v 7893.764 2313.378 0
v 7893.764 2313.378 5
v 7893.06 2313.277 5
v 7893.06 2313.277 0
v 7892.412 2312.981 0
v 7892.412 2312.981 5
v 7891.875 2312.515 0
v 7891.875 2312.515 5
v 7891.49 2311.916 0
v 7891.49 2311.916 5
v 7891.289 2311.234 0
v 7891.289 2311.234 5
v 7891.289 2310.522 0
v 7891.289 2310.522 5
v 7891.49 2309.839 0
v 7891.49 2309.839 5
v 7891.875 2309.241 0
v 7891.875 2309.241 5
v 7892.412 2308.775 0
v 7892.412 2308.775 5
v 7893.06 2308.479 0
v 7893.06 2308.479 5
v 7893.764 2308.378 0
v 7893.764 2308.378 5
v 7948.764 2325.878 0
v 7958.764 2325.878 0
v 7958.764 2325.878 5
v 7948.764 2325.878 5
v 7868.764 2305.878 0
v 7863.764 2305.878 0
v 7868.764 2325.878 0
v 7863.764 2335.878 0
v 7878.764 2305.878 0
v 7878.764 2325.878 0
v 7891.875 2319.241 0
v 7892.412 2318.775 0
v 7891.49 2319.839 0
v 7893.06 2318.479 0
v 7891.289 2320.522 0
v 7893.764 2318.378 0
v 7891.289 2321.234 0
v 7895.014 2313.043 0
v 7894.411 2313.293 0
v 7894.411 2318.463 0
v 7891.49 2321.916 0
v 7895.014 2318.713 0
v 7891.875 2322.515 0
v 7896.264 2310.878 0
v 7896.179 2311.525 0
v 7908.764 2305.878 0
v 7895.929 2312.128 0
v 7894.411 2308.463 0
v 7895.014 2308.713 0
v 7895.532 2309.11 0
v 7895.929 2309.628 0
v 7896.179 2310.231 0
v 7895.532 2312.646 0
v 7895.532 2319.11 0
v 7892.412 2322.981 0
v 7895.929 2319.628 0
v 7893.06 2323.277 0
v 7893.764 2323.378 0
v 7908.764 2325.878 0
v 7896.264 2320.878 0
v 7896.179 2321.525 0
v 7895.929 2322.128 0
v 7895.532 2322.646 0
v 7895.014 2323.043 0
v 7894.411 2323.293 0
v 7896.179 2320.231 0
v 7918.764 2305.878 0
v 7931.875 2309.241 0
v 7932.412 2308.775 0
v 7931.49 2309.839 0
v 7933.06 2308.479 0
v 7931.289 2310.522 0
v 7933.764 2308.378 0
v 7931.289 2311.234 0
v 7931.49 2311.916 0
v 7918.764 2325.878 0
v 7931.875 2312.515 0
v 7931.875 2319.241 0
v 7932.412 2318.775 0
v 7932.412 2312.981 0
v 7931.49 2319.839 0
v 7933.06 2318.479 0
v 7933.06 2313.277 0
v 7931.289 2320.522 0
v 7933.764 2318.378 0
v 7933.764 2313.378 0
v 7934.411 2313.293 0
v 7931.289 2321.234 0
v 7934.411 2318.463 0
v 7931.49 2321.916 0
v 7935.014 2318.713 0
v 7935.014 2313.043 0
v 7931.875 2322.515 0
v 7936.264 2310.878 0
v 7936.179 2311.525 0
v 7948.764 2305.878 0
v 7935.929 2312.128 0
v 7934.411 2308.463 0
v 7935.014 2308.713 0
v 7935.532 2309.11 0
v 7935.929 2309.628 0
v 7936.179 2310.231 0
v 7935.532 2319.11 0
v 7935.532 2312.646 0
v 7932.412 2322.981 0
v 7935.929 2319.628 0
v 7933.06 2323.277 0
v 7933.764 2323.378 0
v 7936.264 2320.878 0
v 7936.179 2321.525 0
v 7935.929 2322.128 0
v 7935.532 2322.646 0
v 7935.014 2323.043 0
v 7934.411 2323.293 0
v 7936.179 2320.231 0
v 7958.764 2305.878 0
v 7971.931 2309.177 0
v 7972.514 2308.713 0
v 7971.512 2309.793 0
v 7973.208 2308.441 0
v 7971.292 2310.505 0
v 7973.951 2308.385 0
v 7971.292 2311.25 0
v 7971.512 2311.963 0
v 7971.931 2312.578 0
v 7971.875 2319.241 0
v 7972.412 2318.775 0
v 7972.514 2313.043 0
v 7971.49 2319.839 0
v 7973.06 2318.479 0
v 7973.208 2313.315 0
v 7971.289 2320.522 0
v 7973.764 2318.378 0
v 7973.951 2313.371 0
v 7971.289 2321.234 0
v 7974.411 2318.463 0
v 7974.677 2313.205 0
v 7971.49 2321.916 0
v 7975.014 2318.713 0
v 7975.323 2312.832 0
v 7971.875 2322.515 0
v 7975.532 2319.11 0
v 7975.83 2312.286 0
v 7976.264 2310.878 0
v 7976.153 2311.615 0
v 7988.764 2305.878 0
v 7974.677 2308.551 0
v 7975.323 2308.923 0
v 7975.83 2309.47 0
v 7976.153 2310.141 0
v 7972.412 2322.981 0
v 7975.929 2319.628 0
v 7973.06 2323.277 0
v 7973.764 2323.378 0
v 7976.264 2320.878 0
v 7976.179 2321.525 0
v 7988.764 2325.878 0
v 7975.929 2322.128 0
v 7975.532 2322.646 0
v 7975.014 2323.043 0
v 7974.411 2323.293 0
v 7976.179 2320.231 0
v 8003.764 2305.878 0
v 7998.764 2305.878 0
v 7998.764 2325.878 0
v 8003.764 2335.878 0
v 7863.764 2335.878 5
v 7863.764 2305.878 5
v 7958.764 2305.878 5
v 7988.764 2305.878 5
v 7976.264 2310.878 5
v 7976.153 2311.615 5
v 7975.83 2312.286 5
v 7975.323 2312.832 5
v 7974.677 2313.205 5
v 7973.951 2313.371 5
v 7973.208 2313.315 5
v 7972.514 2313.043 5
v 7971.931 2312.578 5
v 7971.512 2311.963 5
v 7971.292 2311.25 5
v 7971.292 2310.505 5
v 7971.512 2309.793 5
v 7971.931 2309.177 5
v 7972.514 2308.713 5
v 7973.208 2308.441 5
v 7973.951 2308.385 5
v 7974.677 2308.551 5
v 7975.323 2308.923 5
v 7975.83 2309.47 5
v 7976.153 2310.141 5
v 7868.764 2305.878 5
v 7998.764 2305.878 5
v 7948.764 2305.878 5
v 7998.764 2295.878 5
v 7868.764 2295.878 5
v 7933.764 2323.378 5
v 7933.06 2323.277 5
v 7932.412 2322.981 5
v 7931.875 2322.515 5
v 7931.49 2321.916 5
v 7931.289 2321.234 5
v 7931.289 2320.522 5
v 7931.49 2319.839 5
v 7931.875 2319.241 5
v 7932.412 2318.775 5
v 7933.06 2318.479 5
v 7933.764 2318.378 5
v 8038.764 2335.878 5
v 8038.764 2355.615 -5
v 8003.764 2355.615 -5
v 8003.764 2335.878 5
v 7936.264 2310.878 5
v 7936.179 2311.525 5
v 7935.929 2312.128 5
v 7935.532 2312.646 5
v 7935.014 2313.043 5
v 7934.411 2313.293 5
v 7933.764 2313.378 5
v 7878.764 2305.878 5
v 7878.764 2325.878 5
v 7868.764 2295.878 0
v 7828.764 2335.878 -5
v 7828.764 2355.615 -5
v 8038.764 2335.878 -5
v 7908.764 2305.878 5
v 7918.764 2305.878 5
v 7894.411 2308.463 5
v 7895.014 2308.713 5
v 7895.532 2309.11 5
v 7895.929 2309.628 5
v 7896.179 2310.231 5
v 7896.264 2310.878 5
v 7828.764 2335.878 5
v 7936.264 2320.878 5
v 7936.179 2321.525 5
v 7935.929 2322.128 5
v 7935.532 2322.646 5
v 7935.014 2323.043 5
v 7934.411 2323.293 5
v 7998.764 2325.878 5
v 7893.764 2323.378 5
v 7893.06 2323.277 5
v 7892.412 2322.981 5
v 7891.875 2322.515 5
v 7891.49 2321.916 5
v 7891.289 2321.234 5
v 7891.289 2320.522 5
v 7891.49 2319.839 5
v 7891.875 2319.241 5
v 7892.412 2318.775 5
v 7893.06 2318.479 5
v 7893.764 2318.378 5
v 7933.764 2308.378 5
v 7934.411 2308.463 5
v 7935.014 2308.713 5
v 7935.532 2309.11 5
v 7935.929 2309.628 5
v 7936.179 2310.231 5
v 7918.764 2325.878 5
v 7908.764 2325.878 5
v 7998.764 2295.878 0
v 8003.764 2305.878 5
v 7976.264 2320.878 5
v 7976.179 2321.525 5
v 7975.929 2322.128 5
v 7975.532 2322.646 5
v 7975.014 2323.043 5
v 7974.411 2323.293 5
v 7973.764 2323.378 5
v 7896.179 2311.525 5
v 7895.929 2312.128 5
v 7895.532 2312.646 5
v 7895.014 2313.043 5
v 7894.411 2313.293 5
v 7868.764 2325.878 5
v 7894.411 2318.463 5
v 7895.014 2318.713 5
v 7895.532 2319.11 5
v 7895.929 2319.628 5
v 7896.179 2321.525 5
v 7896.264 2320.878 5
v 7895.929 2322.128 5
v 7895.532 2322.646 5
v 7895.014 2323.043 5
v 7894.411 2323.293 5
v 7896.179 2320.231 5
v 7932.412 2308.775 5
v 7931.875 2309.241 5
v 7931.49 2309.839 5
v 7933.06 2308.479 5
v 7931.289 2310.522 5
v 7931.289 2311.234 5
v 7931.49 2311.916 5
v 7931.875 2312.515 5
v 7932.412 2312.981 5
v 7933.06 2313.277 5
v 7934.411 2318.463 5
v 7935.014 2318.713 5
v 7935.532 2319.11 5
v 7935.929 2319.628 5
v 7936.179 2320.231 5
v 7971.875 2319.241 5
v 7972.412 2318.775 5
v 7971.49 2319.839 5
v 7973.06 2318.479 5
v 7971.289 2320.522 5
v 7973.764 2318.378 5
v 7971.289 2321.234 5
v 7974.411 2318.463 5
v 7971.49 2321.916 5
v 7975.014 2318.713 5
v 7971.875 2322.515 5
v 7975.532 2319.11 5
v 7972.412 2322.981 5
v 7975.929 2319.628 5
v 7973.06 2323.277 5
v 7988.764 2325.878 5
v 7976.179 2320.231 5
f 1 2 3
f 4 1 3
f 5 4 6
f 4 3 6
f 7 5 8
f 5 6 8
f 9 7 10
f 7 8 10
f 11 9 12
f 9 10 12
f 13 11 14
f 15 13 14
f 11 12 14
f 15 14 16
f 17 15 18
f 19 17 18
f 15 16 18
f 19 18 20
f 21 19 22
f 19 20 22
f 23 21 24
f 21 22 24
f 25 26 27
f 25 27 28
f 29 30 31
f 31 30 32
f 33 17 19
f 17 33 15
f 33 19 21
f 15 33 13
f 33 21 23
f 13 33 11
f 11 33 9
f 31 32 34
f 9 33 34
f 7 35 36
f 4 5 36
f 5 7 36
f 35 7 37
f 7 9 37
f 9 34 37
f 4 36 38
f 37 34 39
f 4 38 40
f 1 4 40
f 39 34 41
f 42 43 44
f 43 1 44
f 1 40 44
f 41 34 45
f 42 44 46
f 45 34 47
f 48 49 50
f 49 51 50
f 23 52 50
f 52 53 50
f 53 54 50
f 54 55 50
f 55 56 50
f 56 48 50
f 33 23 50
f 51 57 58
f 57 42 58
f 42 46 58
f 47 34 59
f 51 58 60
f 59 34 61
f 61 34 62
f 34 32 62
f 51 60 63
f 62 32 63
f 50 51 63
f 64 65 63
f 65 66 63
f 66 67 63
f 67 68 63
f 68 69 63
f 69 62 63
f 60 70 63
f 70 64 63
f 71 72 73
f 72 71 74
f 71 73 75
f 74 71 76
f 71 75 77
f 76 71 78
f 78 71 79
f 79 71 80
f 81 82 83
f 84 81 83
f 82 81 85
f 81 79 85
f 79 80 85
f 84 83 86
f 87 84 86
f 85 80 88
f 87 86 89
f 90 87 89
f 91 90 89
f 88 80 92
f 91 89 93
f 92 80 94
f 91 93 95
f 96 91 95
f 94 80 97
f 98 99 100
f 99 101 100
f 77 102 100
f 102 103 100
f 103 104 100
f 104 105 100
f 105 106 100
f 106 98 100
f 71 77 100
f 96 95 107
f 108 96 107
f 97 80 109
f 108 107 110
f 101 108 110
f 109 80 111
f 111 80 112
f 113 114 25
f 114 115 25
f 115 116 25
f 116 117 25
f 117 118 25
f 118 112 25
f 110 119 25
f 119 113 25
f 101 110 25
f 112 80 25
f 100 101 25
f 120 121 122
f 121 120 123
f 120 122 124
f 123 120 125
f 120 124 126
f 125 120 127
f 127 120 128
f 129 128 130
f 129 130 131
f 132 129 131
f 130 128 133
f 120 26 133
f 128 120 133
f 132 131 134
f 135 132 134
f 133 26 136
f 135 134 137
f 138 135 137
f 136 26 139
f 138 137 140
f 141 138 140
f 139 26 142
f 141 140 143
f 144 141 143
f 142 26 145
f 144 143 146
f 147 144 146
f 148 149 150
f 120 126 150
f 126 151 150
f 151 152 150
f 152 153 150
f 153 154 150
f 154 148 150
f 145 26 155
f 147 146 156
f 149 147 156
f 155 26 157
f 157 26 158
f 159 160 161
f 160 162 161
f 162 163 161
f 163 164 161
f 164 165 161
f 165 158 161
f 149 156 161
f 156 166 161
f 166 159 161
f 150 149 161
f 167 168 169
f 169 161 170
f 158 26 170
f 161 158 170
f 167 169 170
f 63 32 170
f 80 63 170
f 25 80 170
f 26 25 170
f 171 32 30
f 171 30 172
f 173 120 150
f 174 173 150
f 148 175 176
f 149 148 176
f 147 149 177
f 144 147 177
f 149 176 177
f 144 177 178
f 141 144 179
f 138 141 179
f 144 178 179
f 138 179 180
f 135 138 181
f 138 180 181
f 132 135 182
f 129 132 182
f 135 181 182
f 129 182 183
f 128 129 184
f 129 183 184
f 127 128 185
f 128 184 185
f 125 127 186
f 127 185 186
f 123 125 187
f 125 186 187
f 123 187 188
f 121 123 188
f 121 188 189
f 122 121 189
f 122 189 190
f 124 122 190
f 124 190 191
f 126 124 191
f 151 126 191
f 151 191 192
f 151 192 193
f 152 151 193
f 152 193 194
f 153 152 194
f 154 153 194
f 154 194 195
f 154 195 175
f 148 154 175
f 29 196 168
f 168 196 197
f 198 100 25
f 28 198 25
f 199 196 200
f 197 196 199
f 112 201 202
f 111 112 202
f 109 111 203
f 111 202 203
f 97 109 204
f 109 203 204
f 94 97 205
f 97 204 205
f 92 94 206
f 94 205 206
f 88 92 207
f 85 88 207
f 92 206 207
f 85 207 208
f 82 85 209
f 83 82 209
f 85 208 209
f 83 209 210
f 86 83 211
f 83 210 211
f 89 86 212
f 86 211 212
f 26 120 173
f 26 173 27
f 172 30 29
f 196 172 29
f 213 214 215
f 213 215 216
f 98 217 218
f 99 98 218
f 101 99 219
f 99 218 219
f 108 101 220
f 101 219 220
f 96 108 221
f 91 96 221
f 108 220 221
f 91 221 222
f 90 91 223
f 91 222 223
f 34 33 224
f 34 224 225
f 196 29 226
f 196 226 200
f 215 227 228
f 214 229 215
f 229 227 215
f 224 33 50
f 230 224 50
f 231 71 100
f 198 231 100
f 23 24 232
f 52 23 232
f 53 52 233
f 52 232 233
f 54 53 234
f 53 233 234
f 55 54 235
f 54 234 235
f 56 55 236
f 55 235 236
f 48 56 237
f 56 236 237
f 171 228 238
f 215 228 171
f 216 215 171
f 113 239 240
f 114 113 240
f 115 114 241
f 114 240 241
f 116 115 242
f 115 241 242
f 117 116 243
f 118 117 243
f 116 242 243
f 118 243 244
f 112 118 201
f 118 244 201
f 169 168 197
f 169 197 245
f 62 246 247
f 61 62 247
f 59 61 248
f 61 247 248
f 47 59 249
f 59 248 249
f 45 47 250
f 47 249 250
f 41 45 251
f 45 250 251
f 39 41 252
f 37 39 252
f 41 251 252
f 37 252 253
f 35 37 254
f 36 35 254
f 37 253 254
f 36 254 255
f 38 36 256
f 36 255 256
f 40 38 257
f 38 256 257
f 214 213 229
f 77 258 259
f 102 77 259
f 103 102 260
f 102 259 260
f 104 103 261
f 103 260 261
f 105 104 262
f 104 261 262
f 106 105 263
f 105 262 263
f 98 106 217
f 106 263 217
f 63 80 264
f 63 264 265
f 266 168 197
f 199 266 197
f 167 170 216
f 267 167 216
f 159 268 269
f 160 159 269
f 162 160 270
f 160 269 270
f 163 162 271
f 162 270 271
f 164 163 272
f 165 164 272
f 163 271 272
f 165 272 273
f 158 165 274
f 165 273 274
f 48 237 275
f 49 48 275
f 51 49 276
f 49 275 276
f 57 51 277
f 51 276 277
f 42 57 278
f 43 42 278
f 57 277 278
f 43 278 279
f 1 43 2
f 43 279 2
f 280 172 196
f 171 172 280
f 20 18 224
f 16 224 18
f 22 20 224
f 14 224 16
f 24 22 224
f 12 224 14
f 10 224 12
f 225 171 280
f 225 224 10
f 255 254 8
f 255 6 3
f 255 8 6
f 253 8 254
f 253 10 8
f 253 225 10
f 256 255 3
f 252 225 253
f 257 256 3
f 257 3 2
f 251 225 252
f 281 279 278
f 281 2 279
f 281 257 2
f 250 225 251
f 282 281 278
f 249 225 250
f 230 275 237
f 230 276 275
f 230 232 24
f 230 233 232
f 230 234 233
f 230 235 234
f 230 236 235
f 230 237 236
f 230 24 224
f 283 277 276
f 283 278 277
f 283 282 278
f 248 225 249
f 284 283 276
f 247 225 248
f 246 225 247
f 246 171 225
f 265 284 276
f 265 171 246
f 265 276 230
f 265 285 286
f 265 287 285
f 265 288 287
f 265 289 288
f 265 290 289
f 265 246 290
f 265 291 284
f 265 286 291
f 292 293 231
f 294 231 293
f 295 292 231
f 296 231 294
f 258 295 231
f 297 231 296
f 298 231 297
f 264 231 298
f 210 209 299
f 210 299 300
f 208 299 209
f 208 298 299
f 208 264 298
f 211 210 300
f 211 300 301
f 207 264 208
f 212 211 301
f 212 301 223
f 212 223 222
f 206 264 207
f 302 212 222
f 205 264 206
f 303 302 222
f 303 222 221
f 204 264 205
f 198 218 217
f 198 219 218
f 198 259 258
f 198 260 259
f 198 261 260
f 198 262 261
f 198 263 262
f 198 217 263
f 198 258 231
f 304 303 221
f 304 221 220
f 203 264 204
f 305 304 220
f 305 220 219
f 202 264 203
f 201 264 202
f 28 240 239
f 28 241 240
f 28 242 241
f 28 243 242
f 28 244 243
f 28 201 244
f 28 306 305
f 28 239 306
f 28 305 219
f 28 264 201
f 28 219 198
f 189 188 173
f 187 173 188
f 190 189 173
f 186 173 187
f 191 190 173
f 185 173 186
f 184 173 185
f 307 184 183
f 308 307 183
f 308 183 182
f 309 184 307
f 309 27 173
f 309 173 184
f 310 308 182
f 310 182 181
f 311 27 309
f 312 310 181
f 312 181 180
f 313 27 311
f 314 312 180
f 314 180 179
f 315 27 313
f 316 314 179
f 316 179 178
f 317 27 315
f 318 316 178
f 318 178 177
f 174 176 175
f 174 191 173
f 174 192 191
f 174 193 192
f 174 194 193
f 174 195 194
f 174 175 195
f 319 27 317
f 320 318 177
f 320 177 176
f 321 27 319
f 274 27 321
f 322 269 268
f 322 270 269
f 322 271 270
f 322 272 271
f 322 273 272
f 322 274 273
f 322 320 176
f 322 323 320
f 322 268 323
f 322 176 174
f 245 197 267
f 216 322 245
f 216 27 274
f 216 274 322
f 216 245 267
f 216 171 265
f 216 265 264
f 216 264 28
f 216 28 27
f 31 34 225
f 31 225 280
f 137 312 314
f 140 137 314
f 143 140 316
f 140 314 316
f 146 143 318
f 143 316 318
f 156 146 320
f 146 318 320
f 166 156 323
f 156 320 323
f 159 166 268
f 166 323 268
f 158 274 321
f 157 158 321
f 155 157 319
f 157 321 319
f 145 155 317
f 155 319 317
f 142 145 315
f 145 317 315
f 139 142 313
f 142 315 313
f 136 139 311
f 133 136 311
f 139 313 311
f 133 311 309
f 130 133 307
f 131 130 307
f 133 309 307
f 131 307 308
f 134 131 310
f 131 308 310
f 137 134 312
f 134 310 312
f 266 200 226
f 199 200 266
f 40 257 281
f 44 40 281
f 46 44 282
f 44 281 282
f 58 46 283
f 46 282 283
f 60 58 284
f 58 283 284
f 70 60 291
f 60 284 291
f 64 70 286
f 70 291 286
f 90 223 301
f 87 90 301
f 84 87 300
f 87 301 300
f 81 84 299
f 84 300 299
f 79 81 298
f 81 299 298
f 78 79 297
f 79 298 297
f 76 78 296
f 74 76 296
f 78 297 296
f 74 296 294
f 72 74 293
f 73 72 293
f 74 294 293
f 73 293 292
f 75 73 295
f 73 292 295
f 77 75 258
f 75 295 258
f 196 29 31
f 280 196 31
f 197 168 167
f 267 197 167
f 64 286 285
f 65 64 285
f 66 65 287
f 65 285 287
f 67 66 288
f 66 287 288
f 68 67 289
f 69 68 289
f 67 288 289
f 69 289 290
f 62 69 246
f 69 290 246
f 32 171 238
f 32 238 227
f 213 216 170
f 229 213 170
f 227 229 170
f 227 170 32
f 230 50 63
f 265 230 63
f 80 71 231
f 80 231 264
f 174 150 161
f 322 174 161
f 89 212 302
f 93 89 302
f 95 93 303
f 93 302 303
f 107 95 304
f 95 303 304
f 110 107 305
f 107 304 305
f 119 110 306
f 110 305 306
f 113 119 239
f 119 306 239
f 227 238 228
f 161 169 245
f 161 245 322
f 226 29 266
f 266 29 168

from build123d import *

# Parameters (mm, degrees)
SKETCH_1_W          = 140
SKETCH_1_H          = 30
EXTRUDE_1_DEPTH     = 5
SKETCH_2_W          = 10
SKETCH_2_H          = 20
CUT_EXTRUDE_1_DEPTH = 50
EXTRUDE_2_DEPTH     = 140
EXTRUDE_3_DEPTH     = 35
EXTRUDE_4_DEPTH     = 35
SKETCH_6_W          = 130
SKETCH_6_H          = 5
EXTRUDE_7_DEPTH     = 10
SKETCH_8_R          = 2.5
CUT_EXTRUDE_2_DEPTH = 10


with BuildPart() as part:
    # 스케치1 → 보스-돌출1 (new body)
    with BuildSketch(Plane.XY):
        with Locations((7933.764003989, 2320.877862595)):
            Rectangle(SKETCH_1_W, SKETCH_1_H)
    extrude(amount=EXTRUDE_1_DEPTH)

    # 스케치2 → 컷-돌출1 (cut)
    with BuildSketch(Plane(origin=(0, 0, 0), x_dir=(-1, 0, 0), z_dir=(0, 0, -1))):
        with Locations((-7993.764003989, 2315.877862595)):
            Rectangle(SKETCH_2_W, SKETCH_2_H)
        with Locations((-7953.764003989, 2315.877862595)):
            Rectangle(SKETCH_2_W, SKETCH_2_H)
        with Locations((-7913.764003989, 2315.877862595)):
            Rectangle(SKETCH_2_W, SKETCH_2_H)
        with Locations((-7873.764003989, 2315.877862595)):
            Rectangle(SKETCH_2_W, SKETCH_2_H)
    extrude(amount=-CUT_EXTRUDE_1_DEPTH, mode=Mode.SUBTRACT)

    # 스케치3 → 보스-돌출2 (add)
    with BuildSketch(Plane.ZY.offset(-7863.764003989)):
        Polygon((-5, 2335.877862595), (0, 2335.877862595), (5, 2335.877862595), (-5, 2355.6147047), align=None)
    extrude(amount=-EXTRUDE_2_DEPTH)

    # 스케치4 → 보스-돌출3 (add)
    with BuildSketch(Plane(origin=(8003.764003989, 0, 0), x_dir=(0, 0, -1), z_dir=(1, 0, 0))):
        Polygon((-5, 2335.877862595), (5, 2335.877862595), (5, 2355.614704701), align=None)
    extrude(amount=EXTRUDE_3_DEPTH)

    # 스케치5 → 보스-돌출4 (add)
    with BuildSketch(Plane.ZY.offset(-7863.764003989)):
        Polygon((5, 2335.877862595), (-5, 2335.877862595), (-5, 2355.6147047), align=None)
    extrude(amount=EXTRUDE_4_DEPTH)

    # 스케치8 → 컷-돌출2 (cut)
    with BuildSketch(Plane.XY.offset(5)):
        with BuildLine():
            ThreePointArc((7896.264003989, 2320.877862595), (7895.531770942, 2322.645629548), (7893.764003989, 2323.377862595))
            Line((7893.764003989, 2323.377862595), (7893.764003989, 2318.377862595))
            ThreePointArc((7893.764003989, 2318.377862595), (7895.531770942, 2319.110095642), (7896.264003989, 2320.877862595))
        make_face()
        with BuildLine():
            Line((7893.764003989, 2318.377862595), (7893.764003989, 2323.377862595))
            ThreePointArc((7893.764003989, 2323.377862595), (7891.264003989, 2320.877862595), (7893.764003989, 2318.377862595))
        make_face()
        with BuildLine():
            ThreePointArc((7896.264003989, 2310.877862595), (7895.531770942, 2312.645629548), (7893.764003989, 2313.377862595))
            Line((7893.764003989, 2313.377862595), (7893.764003989, 2308.377862595))
            ThreePointArc((7893.764003989, 2308.377862595), (7895.531770942, 2309.110095642), (7896.264003989, 2310.877862595))
        make_face()
        with BuildLine():
            Line((7893.764003989, 2308.377862595), (7893.764003989, 2313.377862595))
            ThreePointArc((7893.764003989, 2313.377862595), (7891.264003989, 2310.877862595), (7893.764003989, 2308.377862595))
        make_face()
        with BuildLine():
            ThreePointArc((7936.264003989, 2320.877862595), (7935.531770942, 2322.645629548), (7933.764003989, 2323.377862595))
            Line((7933.764003989, 2323.377862595), (7933.764003989, 2318.377862595))
            ThreePointArc((7933.764003989, 2318.377862595), (7935.531770942, 2319.110095642), (7936.264003989, 2320.877862595))
        make_face()
        with BuildLine():
            Line((7933.764003989, 2318.377862595), (7933.764003989, 2323.377862595))
            ThreePointArc((7933.764003989, 2323.377862595), (7931.264003989, 2320.877862595), (7933.764003989, 2318.377862595))
        make_face()
        with BuildLine():
            ThreePointArc((7933.764003989, 2313.377862595), (7931.264003989, 2310.877862595), (7933.764003989, 2308.377862595))
            Line((7933.764003989, 2308.377862595), (7933.764003989, 2313.377862595))
        make_face()
        with BuildLine():
            Line((7933.764003989, 2313.377862595), (7933.764003989, 2308.377862595))
            ThreePointArc((7933.764003989, 2308.377862595), (7935.531770942, 2309.110095642), (7936.264003989, 2310.877862595))
            ThreePointArc((7936.264003989, 2310.877862595), (7935.531770942, 2312.645629548), (7933.764003989, 2313.377862595))
        make_face()
        with BuildLine():
            ThreePointArc((7976.264003989, 2320.877862595), (7975.531770942, 2322.645629548), (7973.764003989, 2323.377862595))
            Line((7973.764003989, 2323.377862595), (7973.764003989, 2318.377862595))
            ThreePointArc((7973.764003989, 2318.377862595), (7975.531770942, 2319.110095642), (7976.264003989, 2320.877862595))
        make_face()
        with BuildLine():
            Line((7973.764003989, 2318.377862595), (7973.764003989, 2323.377862595))
            ThreePointArc((7973.764003989, 2323.377862595), (7971.264003989, 2320.877862595), (7973.764003989, 2318.377862595))
        make_face()
        with Locations((7973.764003989, 2310.877862595)):
            Circle(SKETCH_8_R)
    extrude(amount=-CUT_EXTRUDE_2_DEPTH, mode=Mode.SUBTRACT)


with BuildPart() as body_2:
    # 스케치6 → 보스-돌출7 (new body)
    with BuildSketch(Plane.XZ.offset(-2305.877862595)):
        with Locations((7933.764003989, 2.5)):
            Rectangle(SKETCH_6_W, SKETCH_6_H)
    extrude(amount=EXTRUDE_7_DEPTH)


solid = Compound([part.part, body_2.part])
